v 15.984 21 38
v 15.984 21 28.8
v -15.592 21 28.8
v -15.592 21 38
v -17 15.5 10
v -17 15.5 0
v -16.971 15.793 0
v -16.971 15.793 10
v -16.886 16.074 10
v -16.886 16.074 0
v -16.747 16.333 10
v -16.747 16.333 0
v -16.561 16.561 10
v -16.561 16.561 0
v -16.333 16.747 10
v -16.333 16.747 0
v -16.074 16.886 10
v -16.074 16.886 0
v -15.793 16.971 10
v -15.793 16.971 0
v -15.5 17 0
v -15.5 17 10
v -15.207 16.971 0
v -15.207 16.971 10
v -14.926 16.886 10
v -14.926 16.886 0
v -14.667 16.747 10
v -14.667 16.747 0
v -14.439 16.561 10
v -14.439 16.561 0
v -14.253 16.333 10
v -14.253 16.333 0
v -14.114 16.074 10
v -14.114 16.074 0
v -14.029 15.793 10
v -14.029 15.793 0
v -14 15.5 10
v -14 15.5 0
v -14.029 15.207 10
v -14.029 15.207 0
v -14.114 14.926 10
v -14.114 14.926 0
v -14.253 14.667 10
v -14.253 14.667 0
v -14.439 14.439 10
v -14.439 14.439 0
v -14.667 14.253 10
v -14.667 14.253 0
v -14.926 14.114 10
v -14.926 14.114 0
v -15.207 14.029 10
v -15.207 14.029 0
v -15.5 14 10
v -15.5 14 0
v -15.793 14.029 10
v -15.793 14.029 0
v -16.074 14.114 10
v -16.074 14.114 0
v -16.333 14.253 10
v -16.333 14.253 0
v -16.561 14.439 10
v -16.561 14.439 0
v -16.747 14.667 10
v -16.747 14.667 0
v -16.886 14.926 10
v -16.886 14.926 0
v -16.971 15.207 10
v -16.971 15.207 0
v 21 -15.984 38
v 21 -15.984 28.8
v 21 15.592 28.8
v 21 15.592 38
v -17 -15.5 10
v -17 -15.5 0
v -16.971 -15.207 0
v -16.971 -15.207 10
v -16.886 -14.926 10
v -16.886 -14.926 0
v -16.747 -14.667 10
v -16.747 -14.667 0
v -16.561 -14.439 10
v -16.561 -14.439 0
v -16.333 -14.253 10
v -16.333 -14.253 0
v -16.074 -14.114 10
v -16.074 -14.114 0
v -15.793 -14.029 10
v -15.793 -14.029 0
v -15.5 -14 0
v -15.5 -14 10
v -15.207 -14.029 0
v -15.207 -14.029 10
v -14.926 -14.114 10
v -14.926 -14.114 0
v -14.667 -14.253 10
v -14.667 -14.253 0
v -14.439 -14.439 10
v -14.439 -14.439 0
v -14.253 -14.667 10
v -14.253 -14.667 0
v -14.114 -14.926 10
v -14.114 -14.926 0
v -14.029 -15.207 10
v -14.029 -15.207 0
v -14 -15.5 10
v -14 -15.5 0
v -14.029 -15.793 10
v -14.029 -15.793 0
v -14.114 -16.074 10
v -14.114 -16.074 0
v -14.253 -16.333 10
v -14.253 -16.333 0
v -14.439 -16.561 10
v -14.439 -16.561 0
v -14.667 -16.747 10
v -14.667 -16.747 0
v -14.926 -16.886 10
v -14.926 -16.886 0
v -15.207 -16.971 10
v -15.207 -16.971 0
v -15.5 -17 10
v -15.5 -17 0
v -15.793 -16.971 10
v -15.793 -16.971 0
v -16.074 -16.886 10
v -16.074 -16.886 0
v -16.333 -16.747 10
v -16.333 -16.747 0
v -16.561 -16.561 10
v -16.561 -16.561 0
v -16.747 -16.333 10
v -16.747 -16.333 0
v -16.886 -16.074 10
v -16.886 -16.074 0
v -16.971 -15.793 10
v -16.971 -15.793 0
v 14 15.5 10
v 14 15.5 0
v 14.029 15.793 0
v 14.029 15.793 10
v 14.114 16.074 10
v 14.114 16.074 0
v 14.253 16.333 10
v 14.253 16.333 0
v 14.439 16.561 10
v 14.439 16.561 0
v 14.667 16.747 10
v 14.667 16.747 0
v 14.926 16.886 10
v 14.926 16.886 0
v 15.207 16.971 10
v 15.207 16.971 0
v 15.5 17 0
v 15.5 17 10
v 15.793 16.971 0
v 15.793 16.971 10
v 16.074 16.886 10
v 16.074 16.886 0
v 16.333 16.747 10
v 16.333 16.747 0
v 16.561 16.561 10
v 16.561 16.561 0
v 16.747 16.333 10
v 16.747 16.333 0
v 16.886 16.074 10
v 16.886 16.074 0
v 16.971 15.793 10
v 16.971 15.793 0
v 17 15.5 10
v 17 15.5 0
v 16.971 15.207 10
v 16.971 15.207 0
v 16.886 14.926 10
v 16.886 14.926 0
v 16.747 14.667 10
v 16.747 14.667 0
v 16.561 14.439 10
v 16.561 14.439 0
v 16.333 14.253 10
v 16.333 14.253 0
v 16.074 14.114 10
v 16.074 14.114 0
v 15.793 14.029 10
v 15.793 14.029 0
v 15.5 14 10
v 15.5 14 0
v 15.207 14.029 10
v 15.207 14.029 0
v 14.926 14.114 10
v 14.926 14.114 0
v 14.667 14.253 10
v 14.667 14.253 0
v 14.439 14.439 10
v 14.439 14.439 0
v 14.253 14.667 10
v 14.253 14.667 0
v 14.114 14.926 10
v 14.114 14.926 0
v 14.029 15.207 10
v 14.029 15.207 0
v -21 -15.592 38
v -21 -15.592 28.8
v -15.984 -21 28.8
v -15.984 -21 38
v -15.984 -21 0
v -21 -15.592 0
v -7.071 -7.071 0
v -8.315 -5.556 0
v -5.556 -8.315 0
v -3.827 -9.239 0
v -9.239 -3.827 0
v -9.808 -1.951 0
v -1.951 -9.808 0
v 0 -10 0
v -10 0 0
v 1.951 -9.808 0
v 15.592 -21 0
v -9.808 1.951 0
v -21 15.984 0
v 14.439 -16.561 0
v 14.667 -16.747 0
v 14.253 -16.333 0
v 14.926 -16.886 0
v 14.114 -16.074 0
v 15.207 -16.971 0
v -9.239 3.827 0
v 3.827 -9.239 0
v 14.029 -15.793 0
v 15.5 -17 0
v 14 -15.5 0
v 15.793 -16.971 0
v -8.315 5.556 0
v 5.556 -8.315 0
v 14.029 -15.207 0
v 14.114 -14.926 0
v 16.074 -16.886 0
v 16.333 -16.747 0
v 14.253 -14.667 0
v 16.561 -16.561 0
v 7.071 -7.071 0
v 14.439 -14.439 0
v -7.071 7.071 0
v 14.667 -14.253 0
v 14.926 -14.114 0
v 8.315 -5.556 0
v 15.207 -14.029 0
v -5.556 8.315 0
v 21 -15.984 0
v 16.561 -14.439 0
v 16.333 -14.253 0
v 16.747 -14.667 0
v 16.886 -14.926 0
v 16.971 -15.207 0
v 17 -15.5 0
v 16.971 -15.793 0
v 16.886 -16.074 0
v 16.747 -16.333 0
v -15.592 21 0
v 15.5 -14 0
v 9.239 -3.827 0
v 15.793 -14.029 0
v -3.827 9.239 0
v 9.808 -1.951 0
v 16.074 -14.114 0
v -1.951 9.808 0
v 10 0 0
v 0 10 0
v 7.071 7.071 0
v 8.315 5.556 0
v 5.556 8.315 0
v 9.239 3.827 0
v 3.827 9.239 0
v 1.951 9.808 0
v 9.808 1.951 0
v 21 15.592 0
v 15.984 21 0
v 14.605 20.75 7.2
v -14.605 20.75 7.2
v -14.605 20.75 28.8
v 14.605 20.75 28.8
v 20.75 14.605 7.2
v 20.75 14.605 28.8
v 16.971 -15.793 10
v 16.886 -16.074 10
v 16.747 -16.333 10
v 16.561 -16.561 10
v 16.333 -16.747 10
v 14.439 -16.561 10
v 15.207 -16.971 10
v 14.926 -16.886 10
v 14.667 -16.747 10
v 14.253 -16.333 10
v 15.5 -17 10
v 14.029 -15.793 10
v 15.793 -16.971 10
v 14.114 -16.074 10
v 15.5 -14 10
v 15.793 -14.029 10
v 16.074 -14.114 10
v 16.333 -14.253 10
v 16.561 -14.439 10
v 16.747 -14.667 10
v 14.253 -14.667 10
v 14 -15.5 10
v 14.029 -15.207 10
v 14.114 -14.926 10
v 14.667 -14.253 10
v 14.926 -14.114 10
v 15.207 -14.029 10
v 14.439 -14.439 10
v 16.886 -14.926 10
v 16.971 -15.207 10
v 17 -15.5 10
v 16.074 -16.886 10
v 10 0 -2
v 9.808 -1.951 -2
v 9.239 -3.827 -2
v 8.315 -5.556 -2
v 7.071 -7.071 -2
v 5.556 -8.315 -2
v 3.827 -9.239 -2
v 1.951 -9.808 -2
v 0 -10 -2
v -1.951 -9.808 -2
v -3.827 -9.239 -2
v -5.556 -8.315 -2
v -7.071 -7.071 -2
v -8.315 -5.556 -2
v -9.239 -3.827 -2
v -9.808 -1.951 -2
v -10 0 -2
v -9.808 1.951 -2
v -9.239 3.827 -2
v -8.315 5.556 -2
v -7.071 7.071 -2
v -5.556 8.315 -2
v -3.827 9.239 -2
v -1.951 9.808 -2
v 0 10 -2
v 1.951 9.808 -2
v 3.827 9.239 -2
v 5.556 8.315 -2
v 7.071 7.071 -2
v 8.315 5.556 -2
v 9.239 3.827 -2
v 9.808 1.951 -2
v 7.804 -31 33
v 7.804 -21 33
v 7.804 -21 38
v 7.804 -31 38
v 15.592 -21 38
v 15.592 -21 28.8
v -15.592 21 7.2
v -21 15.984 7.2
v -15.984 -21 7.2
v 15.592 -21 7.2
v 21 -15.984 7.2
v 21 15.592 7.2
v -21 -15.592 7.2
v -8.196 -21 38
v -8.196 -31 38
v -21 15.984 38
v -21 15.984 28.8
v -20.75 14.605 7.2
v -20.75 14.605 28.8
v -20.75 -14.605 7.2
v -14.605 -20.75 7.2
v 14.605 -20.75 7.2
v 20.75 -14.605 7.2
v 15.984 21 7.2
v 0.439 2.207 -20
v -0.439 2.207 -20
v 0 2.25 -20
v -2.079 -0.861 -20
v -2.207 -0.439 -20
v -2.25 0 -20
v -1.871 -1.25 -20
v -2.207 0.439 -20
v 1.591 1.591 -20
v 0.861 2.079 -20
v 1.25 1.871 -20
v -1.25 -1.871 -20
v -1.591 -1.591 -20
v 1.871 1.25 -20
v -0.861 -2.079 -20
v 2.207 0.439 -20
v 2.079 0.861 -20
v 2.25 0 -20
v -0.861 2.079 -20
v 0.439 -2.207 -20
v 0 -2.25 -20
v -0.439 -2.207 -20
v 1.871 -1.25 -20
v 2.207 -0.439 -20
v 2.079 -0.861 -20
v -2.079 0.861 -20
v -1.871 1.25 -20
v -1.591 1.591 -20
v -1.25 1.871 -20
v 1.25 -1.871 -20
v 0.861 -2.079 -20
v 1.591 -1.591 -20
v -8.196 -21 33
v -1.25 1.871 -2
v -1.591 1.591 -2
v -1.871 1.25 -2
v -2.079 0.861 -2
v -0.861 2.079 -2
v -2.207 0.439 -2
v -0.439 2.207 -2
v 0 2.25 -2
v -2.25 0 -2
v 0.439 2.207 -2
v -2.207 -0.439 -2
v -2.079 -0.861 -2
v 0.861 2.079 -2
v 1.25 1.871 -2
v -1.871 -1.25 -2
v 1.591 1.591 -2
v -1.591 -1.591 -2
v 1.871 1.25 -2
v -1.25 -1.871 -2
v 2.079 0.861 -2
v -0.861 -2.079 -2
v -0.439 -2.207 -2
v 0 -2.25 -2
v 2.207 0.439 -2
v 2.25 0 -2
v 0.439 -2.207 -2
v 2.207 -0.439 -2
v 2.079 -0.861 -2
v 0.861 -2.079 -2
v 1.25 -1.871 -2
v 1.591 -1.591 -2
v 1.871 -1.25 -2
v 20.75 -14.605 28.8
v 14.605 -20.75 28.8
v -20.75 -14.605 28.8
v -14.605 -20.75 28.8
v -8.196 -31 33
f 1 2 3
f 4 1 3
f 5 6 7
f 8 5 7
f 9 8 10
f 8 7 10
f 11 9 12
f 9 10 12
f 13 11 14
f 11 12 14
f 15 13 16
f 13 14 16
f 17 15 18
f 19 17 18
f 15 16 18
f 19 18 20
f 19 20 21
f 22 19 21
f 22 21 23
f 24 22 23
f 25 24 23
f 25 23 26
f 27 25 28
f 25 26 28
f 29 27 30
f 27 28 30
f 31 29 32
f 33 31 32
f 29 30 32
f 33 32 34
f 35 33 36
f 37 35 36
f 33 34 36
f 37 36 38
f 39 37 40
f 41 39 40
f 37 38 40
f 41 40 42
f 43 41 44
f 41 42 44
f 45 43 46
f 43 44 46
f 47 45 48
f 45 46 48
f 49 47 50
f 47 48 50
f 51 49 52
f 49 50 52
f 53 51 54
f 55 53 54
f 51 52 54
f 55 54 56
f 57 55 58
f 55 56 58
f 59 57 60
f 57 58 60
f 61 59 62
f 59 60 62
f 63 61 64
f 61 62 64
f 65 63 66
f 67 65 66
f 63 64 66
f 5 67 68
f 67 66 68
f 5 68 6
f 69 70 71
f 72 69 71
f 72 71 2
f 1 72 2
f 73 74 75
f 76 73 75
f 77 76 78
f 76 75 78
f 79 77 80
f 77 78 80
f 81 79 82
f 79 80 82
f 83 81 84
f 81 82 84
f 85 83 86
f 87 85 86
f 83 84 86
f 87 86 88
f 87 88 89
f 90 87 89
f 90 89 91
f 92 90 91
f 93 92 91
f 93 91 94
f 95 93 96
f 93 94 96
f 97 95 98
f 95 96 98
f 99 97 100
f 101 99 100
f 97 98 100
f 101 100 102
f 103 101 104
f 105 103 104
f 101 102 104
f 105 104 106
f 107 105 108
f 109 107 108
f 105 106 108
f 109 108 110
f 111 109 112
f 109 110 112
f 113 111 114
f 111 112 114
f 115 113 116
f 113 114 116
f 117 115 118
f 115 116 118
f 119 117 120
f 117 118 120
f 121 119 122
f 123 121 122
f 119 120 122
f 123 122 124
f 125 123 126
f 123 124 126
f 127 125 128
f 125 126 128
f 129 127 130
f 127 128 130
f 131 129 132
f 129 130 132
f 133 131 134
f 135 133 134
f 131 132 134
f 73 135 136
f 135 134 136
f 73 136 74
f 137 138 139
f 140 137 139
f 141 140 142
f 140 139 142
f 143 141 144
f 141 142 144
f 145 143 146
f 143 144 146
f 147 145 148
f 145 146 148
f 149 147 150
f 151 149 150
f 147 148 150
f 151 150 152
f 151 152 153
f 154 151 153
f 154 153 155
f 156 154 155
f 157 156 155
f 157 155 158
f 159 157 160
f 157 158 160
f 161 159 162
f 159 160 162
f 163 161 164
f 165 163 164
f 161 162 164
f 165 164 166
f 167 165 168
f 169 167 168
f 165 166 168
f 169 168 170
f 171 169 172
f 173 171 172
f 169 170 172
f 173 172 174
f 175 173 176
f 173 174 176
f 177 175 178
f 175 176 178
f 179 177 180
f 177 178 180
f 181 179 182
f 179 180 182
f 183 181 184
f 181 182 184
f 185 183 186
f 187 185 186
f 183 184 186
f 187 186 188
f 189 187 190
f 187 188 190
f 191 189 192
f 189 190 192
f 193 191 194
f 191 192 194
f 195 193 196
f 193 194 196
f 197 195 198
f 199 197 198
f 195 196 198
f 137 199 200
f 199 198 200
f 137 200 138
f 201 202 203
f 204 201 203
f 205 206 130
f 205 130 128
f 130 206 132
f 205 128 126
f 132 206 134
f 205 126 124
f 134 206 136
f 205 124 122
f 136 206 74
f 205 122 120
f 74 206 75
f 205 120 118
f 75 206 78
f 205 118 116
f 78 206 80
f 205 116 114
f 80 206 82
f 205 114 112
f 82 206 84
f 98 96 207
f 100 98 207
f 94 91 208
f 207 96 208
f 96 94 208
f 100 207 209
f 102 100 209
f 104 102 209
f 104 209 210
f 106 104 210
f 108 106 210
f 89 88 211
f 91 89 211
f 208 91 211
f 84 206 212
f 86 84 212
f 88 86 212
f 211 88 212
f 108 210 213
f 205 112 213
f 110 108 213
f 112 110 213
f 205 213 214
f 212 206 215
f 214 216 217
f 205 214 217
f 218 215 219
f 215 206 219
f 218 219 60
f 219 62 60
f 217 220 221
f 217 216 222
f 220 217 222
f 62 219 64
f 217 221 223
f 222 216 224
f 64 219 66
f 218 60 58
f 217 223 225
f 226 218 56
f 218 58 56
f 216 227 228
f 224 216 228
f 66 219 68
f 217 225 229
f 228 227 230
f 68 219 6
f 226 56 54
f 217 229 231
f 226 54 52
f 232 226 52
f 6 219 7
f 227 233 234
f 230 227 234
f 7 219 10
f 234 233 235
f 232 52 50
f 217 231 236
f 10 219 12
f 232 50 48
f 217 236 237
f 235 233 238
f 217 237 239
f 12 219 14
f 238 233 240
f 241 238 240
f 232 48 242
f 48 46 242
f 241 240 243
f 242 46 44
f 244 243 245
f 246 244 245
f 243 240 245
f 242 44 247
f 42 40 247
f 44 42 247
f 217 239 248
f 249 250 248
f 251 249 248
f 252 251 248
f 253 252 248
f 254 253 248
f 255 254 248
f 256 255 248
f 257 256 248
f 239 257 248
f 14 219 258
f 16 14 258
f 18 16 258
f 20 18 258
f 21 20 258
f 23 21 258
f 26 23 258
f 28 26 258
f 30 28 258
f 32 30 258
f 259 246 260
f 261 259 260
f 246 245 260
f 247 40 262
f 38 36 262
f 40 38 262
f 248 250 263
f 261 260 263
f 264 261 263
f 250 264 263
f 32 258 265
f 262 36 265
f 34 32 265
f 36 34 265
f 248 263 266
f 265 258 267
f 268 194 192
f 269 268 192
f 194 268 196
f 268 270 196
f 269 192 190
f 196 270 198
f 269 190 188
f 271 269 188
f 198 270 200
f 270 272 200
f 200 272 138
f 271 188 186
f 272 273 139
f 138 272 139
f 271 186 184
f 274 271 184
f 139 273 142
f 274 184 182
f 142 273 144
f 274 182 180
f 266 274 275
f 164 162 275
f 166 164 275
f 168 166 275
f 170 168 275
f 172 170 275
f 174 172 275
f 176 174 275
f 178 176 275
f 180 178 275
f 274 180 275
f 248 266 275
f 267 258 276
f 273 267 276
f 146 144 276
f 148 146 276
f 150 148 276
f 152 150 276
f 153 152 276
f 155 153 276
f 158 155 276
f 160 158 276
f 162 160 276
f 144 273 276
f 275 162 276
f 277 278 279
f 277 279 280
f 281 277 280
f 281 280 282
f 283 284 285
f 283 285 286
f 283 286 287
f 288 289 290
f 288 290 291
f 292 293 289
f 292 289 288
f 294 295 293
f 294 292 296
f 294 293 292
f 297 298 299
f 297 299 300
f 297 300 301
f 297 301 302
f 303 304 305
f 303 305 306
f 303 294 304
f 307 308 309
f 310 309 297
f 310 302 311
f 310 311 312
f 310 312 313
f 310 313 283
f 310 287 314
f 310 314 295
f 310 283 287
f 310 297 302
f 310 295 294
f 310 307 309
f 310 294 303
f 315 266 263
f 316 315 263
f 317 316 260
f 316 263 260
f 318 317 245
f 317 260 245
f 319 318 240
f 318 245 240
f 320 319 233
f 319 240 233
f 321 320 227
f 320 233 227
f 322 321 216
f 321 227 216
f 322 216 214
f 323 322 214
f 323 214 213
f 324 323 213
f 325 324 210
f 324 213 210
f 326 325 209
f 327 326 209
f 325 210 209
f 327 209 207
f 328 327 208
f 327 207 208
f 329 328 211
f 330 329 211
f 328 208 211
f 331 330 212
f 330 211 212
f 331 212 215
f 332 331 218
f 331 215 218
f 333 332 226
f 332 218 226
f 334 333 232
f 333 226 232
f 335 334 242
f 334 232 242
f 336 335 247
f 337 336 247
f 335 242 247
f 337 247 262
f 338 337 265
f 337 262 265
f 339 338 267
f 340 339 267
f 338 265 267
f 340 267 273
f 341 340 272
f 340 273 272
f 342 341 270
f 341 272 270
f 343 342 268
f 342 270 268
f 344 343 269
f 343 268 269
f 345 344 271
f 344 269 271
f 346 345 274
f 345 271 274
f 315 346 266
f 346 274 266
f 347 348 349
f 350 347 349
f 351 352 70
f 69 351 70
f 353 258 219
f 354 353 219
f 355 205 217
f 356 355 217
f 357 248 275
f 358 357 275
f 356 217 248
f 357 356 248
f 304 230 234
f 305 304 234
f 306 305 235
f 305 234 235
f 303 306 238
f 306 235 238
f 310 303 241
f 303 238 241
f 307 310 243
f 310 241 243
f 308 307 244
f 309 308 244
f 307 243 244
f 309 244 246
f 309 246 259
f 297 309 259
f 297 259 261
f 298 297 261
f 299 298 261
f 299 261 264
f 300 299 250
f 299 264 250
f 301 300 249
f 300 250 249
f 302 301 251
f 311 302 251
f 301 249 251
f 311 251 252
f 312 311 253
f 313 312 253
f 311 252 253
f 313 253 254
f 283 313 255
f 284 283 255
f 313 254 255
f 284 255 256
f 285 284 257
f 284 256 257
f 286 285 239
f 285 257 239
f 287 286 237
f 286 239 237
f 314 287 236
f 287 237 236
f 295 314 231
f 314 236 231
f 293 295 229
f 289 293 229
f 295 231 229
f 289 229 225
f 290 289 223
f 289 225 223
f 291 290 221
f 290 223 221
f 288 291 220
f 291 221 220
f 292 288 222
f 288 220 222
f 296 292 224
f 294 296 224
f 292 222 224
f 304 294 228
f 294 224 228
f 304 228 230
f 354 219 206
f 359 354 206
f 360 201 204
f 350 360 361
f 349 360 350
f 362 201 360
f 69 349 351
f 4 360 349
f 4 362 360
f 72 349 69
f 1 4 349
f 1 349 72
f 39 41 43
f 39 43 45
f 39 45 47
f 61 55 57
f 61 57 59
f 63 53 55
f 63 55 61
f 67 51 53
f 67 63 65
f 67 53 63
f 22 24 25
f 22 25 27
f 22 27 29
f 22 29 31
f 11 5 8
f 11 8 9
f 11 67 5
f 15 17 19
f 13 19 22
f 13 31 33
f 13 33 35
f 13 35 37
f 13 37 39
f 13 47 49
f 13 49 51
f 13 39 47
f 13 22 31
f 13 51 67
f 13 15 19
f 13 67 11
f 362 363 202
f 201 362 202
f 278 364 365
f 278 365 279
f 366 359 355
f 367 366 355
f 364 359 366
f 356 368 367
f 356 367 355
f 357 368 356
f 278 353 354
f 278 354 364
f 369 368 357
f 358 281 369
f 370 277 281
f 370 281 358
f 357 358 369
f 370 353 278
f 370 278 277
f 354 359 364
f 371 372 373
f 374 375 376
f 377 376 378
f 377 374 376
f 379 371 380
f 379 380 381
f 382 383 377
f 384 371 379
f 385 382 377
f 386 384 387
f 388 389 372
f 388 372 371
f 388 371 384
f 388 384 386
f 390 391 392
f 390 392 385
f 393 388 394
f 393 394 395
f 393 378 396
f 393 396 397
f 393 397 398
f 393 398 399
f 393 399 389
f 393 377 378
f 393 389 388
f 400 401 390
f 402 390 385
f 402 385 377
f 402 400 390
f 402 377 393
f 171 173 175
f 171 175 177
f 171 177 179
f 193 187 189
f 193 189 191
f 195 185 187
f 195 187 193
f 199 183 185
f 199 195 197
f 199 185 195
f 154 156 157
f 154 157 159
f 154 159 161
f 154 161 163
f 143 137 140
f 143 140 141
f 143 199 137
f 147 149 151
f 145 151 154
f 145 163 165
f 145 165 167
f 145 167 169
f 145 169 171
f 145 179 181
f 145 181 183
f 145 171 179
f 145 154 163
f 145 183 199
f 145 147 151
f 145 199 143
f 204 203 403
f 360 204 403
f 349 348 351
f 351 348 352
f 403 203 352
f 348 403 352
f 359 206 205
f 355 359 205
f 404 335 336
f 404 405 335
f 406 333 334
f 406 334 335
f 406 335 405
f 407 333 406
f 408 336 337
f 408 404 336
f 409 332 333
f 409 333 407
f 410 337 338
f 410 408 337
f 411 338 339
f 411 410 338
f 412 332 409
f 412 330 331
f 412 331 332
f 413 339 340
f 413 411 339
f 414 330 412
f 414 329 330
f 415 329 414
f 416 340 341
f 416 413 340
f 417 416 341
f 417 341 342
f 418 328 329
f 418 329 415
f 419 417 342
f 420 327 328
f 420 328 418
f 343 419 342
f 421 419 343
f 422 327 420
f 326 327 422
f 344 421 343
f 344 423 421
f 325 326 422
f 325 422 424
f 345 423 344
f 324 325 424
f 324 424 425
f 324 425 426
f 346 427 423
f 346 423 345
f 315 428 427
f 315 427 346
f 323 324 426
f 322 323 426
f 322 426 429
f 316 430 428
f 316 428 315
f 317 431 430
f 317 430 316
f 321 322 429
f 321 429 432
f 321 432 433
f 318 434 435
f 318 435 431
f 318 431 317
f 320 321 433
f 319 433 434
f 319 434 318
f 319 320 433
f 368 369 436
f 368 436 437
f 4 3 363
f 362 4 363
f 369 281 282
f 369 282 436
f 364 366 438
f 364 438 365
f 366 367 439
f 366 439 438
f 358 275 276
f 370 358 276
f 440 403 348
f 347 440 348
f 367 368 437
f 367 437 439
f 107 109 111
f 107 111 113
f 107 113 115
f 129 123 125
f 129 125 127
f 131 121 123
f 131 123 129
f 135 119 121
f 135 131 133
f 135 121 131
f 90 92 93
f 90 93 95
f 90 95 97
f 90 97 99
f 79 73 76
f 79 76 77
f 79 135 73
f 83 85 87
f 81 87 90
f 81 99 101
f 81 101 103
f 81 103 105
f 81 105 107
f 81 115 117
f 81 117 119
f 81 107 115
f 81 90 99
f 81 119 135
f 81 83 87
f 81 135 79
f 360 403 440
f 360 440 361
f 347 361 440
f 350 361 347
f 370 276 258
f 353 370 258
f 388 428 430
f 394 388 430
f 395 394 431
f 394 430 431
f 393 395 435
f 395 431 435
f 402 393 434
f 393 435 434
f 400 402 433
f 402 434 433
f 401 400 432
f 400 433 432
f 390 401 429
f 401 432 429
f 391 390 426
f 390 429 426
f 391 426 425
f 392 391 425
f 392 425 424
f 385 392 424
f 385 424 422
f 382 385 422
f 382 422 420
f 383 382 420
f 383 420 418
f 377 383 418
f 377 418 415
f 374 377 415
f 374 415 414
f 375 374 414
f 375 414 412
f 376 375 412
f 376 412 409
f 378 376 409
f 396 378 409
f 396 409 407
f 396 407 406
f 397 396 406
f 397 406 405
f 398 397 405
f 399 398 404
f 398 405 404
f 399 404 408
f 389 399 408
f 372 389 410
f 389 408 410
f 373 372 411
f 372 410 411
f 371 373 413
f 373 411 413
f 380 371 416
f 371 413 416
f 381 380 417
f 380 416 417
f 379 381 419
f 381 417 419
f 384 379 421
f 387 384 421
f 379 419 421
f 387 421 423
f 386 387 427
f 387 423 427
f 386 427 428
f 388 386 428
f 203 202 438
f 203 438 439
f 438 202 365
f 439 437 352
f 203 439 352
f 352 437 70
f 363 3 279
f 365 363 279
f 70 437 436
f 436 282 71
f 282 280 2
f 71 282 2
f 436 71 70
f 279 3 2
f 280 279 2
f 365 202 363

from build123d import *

# Parameters (mm, degrees)
RESSALTO_EXTRUS_O1_DEPTH   = 38
CORTE_EXTRUS_O_FINA1_START = -30.8
CORTE_EXTRUS_O_FINA1_DEPTH = 21.6
ESBO_O3_R                  = 2.25
RESSALTO_EXTRUS_O2_DEPTH   = 20
ESBO_O4_R                  = 10
RESSALTO_EXTRUS_O3_DEPTH   = 2
ESBO_O5_R                  = 1.5
CORTE_EXTRUS_O1_DEPTH      = 10
ESBO_O7_W                  = 16
ESBO_O7_H                  = 5
RESSALTO_EXTRUS_O4_DEPTH   = 10


# Read off the part's stored shape, not the designer's step: Corte-Extrusão-Fina1
with BuildPart() as part:
    # Esboço1 → Ressalto-extrusão1 (new body)
    with BuildSketch(Plane.XY):
        Polygon((-21, -15.592171873), (-15.984175996, -21), (15.592171873, -21), (21, -15.984175996), (21, 15.592171873), (15.984175996, 21), (-15.592171873, 21), (-21, 15.984175996), align=None)
    extrude(amount=RESSALTO_EXTRUS_O1_DEPTH)

    # Corte-Extrusão-Fina1 outline → Corte-Extrusão-Fina1 (cut)
    with BuildSketch(Plane.XY.offset(38).offset(CORTE_EXTRUS_O_FINA1_START)):
        Polygon((15.592171873, -21), (21, -15.984175996), (21, 15.592171873), (15.984175996, 21), (-15.592171873, 21), (-21, 15.984175996), (-21, -15.592171873), (-15.984175996, -21), align=None)
        Polygon((14.605339059, 20.75), (20.75, 14.605339059), (20.75, -14.605339059), (14.605339059, -20.75), (-14.605339059, -20.75), (-20.75, -14.605339059), (-20.75, 14.605339059), (-14.605339059, 20.75), align=None, mode=Mode.SUBTRACT)
    extrude(amount=CORTE_EXTRUS_O_FINA1_DEPTH, mode=Mode.SUBTRACT)

    # Esboço3 → Ressalto-extrusão2 (add)
    with BuildSketch(Plane(origin=(0, 0, 0), x_dir=(-1, 0, 0), z_dir=(0, 0, -1))):
        with Locations(Location((0, 0, 0), (0, 0, 180))):
            Circle(ESBO_O3_R)
    extrude(amount=RESSALTO_EXTRUS_O2_DEPTH)

    # Esboço4 → Ressalto-extrusão3 (add)
    with BuildSketch(Plane(origin=(0, 0, 0), x_dir=(-1, 0, 0), z_dir=(0, 0, -1))):
        with Locations(Location((0, 0, 0), (0, 0, 180))):
            Circle(ESBO_O4_R)
    extrude(amount=RESSALTO_EXTRUS_O3_DEPTH)

    # Esboço5 → Corte-extrusão1 (cut)
    with BuildSketch(Plane(origin=(0, 0, 0), x_dir=(-1, 0, 0), z_dir=(0, 0, -1))):
        with Locations((15.5, -15.5)):
            Circle(ESBO_O5_R)
        with Locations((-15.5, -15.5)):
            Circle(ESBO_O5_R)
        with Locations((-15.5, 15.5)):
            Circle(ESBO_O5_R)
        with Locations((15.5, 15.5)):
            Circle(ESBO_O5_R)
    extrude(amount=-CORTE_EXTRUS_O1_DEPTH, mode=Mode.SUBTRACT)

    # Esboço7 → Ressalto-extrusão4 (add)
    with BuildSketch(Plane.XZ.offset(21)):
        with Locations((-0.196002062, 35.5)):
            Rectangle(ESBO_O7_W, ESBO_O7_H)
    extrude(amount=RESSALTO_EXTRUS_O4_DEPTH)


solid = part.part
